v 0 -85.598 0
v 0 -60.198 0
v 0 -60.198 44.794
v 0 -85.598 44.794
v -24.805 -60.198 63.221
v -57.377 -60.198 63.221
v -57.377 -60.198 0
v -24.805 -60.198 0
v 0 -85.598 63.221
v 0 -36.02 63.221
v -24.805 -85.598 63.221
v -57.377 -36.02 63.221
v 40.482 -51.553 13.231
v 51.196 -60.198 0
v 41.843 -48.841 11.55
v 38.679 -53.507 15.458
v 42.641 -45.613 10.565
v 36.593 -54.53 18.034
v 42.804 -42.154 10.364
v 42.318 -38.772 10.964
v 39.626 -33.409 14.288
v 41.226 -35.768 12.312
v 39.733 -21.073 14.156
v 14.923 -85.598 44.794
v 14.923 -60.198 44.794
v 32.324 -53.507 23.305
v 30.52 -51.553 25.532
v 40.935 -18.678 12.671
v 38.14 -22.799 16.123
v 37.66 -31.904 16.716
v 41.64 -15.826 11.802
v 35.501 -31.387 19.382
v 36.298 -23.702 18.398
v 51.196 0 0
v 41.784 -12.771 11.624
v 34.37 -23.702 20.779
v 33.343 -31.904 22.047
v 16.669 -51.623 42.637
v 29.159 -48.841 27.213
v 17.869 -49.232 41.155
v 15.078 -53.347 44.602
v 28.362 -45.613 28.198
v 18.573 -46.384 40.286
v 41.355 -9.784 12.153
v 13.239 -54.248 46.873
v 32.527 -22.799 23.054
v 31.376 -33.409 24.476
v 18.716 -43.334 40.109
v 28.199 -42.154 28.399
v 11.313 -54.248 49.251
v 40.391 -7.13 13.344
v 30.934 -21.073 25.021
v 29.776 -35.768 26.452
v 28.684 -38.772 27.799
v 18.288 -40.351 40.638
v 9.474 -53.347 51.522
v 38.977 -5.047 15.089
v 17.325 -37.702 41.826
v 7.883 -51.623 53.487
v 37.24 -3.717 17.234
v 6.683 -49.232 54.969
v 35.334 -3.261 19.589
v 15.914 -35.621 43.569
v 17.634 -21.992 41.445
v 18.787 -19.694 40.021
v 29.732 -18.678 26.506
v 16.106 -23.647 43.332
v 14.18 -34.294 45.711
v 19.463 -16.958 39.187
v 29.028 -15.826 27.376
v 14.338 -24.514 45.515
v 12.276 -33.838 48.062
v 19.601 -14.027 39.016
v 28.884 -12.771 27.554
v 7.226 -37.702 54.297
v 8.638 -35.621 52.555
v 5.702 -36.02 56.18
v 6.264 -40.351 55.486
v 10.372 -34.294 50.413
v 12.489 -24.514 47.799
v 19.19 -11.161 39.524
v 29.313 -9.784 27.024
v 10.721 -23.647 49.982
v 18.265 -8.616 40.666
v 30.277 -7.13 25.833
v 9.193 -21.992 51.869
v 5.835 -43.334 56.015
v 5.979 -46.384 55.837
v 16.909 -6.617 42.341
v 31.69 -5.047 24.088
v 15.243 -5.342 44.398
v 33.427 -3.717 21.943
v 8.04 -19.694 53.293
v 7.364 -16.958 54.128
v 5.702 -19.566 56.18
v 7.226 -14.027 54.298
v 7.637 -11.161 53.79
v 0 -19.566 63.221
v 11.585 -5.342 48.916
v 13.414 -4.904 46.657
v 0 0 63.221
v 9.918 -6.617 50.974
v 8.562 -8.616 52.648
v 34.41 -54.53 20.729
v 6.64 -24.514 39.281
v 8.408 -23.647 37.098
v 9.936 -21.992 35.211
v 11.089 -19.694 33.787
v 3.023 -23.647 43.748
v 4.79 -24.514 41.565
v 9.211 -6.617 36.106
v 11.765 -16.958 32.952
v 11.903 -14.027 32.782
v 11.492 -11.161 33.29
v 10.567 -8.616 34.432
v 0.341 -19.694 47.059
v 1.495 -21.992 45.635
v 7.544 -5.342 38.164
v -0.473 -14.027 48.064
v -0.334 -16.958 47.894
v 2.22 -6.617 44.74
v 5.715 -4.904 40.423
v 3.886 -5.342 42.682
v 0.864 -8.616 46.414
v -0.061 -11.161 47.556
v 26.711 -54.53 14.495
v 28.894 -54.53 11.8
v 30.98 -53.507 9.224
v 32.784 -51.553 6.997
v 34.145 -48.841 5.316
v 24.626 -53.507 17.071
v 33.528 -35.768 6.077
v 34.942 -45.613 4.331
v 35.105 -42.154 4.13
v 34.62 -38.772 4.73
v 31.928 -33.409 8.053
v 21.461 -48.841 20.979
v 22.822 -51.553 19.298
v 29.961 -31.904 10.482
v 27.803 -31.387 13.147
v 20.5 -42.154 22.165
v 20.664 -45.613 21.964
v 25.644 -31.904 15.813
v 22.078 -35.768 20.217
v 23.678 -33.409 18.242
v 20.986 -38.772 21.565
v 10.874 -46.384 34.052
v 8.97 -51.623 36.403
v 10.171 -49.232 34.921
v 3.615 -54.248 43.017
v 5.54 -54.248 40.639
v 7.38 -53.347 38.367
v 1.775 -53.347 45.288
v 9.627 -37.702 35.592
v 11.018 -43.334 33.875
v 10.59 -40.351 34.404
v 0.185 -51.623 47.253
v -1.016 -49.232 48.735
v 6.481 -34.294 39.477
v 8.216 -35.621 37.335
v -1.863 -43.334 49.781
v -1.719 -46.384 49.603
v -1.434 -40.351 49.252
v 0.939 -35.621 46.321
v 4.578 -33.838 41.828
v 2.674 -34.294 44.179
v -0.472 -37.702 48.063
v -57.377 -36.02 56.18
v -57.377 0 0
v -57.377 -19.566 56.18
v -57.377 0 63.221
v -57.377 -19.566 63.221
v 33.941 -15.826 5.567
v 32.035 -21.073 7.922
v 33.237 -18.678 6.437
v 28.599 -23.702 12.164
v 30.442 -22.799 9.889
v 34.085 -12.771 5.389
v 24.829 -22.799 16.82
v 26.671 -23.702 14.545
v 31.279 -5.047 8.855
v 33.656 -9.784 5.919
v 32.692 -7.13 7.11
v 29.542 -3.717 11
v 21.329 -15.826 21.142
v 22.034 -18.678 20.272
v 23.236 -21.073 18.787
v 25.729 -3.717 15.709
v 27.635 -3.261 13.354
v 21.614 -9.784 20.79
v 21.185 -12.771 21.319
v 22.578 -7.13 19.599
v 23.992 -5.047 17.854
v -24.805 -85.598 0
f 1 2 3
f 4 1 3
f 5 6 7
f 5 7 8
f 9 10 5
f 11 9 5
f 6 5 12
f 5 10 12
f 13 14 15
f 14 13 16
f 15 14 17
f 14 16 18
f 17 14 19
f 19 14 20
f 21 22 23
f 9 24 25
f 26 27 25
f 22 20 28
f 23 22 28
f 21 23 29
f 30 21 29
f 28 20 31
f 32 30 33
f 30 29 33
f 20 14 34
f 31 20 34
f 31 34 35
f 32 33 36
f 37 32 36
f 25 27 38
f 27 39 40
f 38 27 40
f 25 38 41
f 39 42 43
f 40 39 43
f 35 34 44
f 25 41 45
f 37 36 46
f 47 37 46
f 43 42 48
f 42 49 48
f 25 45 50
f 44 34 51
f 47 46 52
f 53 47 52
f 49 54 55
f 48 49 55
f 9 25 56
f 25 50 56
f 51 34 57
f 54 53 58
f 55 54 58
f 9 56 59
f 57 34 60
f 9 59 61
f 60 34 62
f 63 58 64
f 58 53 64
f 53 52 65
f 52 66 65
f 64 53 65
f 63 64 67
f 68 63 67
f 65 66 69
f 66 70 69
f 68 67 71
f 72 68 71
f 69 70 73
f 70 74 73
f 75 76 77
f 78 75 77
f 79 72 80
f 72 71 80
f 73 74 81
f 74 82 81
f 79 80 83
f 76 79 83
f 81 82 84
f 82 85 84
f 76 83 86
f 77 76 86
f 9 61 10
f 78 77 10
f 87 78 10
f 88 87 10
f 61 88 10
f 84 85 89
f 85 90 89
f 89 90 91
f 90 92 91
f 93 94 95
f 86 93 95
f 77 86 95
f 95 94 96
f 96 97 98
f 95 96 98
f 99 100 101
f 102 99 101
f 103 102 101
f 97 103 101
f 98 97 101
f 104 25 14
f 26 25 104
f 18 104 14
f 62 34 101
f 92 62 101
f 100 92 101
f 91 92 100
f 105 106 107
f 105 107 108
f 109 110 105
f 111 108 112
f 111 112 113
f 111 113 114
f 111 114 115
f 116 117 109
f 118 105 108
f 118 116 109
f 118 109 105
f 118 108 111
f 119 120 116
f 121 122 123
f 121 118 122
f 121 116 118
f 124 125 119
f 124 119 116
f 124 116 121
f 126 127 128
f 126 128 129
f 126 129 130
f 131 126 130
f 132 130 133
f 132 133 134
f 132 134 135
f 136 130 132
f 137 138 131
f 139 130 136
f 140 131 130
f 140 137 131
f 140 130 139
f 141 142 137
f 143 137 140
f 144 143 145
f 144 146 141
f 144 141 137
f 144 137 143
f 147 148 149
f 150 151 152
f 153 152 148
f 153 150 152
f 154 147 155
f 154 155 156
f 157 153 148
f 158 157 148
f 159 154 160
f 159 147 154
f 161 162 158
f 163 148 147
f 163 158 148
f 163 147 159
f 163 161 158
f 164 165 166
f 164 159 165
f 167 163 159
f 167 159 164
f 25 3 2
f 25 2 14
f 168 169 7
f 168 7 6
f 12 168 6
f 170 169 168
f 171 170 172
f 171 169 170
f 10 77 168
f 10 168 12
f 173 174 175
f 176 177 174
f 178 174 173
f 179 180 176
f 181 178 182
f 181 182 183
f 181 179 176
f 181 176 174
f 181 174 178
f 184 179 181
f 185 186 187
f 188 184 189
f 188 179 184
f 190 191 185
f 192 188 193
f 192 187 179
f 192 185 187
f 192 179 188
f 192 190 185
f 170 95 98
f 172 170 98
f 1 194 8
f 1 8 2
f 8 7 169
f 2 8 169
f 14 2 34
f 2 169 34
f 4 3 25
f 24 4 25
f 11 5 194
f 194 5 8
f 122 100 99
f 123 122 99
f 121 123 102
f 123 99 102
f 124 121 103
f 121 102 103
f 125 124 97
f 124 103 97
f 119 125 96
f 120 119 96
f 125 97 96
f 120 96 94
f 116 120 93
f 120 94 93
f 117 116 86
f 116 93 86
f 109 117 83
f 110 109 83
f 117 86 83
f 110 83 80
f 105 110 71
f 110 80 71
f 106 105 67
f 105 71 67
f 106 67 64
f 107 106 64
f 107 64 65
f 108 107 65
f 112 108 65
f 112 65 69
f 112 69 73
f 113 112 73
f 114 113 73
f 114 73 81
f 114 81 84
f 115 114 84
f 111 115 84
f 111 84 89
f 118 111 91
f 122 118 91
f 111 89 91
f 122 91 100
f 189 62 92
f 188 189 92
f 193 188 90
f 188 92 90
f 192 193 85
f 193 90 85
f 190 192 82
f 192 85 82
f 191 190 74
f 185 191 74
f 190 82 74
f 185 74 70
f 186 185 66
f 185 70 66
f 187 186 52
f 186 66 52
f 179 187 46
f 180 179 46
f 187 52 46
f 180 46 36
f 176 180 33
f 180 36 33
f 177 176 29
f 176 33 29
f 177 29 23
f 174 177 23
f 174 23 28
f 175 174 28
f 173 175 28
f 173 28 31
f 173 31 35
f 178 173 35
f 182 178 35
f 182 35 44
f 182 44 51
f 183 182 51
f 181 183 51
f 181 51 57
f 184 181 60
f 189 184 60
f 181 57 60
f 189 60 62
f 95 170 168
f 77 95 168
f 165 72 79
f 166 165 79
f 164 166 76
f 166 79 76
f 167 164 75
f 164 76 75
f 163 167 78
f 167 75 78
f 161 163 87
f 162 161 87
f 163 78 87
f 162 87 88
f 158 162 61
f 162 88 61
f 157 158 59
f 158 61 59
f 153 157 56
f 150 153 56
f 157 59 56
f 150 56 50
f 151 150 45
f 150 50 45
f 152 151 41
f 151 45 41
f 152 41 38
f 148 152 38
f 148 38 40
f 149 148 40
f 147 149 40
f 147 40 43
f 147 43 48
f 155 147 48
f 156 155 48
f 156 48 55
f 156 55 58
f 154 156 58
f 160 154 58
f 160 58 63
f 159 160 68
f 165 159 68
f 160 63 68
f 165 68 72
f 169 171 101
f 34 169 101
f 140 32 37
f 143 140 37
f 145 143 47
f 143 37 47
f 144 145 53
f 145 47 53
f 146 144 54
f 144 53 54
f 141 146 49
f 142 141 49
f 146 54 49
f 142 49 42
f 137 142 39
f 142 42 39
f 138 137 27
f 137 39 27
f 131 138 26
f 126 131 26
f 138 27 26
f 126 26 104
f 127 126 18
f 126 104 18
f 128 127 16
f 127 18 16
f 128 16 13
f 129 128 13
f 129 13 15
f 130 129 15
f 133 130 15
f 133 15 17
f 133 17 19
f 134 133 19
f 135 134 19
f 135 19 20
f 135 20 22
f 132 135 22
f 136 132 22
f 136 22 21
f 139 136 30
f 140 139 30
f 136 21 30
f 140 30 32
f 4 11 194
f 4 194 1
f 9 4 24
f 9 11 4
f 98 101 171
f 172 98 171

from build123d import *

# Parameters (mm, degrees)
F0_W     = 57.3766939342
F0_H     = 63.22119385
F1_DEPTH = 60.198
F2_R     = 10.2625762698
F2_R_2   = 9.860099692
F2_R_3   = 10.2778616748
F2_R_4   = 11.6361119367
F3_DEPTH = 9.906
F5_DEPTH = 25.4
F6_W     = 16.4541173726
F6_H     = 7.0413090289
F7_DEPTH = 208.28


with BuildPart() as f1:
    # F0 (on Front) → F1 (new body)
    with BuildSketch(Plane.XZ):
        with Locations((-28.6883469671, 31.610596925)):
            Rectangle(F0_W, F0_H)
        Polygon((0, 63.22119385), (0, 0), (51.1963777244, 0), align=None)
    extrude(amount=F1_DEPTH)

    # F2 (on face) → F3 (cut)
    with BuildSketch(Plane(origin=(30.9199380754, 0, 25.0388949105), x_dir=(0, 1, 0), z_dir=(0.7771407648, 0, 0.6293268083))):
        with Locations((-44.1004633904, 29.6253170818)):
            Circle(F2_R)
        with Locations((-14.7637147456, 27.8175938874)):
            Circle(F2_R_2)
        with Locations((-13.5386008769, -7.013282273)):
            Circle(F2_R_3)
        with Locations((-43.0233776569, -7.2796405293)):
            Circle(F2_R_4)
    extrude(amount=-F3_DEPTH, mode=Mode.SUBTRACT)

    # F4 (on face) → F5 (join)
    with BuildSketch(Plane.XZ.offset(60.198)):
        Polygon((0, 63.22119385), (-24.8047709465, 63.22119385), (-24.8047709465, 0), (0, 0), (0, 44.7936064249), align=None)
        Polygon((14.9226180164, 44.7936064249), (0, 63.22119385), (0, 44.7936064249), align=None)
    extrude(amount=F5_DEPTH)

    # F6 (on face) → F7 (cut)
    with BuildSketch(Plane(origin=(-57.3766939342, 0, 0), x_dir=(0, -1, 0), z_dir=(-1, 0, 0))):
        with Locations((27.7932761237, 59.7005393356)):
            Rectangle(F6_W, F6_H)
    extrude(amount=-F7_DEPTH, mode=Mode.SUBTRACT)


solid = f1.part
